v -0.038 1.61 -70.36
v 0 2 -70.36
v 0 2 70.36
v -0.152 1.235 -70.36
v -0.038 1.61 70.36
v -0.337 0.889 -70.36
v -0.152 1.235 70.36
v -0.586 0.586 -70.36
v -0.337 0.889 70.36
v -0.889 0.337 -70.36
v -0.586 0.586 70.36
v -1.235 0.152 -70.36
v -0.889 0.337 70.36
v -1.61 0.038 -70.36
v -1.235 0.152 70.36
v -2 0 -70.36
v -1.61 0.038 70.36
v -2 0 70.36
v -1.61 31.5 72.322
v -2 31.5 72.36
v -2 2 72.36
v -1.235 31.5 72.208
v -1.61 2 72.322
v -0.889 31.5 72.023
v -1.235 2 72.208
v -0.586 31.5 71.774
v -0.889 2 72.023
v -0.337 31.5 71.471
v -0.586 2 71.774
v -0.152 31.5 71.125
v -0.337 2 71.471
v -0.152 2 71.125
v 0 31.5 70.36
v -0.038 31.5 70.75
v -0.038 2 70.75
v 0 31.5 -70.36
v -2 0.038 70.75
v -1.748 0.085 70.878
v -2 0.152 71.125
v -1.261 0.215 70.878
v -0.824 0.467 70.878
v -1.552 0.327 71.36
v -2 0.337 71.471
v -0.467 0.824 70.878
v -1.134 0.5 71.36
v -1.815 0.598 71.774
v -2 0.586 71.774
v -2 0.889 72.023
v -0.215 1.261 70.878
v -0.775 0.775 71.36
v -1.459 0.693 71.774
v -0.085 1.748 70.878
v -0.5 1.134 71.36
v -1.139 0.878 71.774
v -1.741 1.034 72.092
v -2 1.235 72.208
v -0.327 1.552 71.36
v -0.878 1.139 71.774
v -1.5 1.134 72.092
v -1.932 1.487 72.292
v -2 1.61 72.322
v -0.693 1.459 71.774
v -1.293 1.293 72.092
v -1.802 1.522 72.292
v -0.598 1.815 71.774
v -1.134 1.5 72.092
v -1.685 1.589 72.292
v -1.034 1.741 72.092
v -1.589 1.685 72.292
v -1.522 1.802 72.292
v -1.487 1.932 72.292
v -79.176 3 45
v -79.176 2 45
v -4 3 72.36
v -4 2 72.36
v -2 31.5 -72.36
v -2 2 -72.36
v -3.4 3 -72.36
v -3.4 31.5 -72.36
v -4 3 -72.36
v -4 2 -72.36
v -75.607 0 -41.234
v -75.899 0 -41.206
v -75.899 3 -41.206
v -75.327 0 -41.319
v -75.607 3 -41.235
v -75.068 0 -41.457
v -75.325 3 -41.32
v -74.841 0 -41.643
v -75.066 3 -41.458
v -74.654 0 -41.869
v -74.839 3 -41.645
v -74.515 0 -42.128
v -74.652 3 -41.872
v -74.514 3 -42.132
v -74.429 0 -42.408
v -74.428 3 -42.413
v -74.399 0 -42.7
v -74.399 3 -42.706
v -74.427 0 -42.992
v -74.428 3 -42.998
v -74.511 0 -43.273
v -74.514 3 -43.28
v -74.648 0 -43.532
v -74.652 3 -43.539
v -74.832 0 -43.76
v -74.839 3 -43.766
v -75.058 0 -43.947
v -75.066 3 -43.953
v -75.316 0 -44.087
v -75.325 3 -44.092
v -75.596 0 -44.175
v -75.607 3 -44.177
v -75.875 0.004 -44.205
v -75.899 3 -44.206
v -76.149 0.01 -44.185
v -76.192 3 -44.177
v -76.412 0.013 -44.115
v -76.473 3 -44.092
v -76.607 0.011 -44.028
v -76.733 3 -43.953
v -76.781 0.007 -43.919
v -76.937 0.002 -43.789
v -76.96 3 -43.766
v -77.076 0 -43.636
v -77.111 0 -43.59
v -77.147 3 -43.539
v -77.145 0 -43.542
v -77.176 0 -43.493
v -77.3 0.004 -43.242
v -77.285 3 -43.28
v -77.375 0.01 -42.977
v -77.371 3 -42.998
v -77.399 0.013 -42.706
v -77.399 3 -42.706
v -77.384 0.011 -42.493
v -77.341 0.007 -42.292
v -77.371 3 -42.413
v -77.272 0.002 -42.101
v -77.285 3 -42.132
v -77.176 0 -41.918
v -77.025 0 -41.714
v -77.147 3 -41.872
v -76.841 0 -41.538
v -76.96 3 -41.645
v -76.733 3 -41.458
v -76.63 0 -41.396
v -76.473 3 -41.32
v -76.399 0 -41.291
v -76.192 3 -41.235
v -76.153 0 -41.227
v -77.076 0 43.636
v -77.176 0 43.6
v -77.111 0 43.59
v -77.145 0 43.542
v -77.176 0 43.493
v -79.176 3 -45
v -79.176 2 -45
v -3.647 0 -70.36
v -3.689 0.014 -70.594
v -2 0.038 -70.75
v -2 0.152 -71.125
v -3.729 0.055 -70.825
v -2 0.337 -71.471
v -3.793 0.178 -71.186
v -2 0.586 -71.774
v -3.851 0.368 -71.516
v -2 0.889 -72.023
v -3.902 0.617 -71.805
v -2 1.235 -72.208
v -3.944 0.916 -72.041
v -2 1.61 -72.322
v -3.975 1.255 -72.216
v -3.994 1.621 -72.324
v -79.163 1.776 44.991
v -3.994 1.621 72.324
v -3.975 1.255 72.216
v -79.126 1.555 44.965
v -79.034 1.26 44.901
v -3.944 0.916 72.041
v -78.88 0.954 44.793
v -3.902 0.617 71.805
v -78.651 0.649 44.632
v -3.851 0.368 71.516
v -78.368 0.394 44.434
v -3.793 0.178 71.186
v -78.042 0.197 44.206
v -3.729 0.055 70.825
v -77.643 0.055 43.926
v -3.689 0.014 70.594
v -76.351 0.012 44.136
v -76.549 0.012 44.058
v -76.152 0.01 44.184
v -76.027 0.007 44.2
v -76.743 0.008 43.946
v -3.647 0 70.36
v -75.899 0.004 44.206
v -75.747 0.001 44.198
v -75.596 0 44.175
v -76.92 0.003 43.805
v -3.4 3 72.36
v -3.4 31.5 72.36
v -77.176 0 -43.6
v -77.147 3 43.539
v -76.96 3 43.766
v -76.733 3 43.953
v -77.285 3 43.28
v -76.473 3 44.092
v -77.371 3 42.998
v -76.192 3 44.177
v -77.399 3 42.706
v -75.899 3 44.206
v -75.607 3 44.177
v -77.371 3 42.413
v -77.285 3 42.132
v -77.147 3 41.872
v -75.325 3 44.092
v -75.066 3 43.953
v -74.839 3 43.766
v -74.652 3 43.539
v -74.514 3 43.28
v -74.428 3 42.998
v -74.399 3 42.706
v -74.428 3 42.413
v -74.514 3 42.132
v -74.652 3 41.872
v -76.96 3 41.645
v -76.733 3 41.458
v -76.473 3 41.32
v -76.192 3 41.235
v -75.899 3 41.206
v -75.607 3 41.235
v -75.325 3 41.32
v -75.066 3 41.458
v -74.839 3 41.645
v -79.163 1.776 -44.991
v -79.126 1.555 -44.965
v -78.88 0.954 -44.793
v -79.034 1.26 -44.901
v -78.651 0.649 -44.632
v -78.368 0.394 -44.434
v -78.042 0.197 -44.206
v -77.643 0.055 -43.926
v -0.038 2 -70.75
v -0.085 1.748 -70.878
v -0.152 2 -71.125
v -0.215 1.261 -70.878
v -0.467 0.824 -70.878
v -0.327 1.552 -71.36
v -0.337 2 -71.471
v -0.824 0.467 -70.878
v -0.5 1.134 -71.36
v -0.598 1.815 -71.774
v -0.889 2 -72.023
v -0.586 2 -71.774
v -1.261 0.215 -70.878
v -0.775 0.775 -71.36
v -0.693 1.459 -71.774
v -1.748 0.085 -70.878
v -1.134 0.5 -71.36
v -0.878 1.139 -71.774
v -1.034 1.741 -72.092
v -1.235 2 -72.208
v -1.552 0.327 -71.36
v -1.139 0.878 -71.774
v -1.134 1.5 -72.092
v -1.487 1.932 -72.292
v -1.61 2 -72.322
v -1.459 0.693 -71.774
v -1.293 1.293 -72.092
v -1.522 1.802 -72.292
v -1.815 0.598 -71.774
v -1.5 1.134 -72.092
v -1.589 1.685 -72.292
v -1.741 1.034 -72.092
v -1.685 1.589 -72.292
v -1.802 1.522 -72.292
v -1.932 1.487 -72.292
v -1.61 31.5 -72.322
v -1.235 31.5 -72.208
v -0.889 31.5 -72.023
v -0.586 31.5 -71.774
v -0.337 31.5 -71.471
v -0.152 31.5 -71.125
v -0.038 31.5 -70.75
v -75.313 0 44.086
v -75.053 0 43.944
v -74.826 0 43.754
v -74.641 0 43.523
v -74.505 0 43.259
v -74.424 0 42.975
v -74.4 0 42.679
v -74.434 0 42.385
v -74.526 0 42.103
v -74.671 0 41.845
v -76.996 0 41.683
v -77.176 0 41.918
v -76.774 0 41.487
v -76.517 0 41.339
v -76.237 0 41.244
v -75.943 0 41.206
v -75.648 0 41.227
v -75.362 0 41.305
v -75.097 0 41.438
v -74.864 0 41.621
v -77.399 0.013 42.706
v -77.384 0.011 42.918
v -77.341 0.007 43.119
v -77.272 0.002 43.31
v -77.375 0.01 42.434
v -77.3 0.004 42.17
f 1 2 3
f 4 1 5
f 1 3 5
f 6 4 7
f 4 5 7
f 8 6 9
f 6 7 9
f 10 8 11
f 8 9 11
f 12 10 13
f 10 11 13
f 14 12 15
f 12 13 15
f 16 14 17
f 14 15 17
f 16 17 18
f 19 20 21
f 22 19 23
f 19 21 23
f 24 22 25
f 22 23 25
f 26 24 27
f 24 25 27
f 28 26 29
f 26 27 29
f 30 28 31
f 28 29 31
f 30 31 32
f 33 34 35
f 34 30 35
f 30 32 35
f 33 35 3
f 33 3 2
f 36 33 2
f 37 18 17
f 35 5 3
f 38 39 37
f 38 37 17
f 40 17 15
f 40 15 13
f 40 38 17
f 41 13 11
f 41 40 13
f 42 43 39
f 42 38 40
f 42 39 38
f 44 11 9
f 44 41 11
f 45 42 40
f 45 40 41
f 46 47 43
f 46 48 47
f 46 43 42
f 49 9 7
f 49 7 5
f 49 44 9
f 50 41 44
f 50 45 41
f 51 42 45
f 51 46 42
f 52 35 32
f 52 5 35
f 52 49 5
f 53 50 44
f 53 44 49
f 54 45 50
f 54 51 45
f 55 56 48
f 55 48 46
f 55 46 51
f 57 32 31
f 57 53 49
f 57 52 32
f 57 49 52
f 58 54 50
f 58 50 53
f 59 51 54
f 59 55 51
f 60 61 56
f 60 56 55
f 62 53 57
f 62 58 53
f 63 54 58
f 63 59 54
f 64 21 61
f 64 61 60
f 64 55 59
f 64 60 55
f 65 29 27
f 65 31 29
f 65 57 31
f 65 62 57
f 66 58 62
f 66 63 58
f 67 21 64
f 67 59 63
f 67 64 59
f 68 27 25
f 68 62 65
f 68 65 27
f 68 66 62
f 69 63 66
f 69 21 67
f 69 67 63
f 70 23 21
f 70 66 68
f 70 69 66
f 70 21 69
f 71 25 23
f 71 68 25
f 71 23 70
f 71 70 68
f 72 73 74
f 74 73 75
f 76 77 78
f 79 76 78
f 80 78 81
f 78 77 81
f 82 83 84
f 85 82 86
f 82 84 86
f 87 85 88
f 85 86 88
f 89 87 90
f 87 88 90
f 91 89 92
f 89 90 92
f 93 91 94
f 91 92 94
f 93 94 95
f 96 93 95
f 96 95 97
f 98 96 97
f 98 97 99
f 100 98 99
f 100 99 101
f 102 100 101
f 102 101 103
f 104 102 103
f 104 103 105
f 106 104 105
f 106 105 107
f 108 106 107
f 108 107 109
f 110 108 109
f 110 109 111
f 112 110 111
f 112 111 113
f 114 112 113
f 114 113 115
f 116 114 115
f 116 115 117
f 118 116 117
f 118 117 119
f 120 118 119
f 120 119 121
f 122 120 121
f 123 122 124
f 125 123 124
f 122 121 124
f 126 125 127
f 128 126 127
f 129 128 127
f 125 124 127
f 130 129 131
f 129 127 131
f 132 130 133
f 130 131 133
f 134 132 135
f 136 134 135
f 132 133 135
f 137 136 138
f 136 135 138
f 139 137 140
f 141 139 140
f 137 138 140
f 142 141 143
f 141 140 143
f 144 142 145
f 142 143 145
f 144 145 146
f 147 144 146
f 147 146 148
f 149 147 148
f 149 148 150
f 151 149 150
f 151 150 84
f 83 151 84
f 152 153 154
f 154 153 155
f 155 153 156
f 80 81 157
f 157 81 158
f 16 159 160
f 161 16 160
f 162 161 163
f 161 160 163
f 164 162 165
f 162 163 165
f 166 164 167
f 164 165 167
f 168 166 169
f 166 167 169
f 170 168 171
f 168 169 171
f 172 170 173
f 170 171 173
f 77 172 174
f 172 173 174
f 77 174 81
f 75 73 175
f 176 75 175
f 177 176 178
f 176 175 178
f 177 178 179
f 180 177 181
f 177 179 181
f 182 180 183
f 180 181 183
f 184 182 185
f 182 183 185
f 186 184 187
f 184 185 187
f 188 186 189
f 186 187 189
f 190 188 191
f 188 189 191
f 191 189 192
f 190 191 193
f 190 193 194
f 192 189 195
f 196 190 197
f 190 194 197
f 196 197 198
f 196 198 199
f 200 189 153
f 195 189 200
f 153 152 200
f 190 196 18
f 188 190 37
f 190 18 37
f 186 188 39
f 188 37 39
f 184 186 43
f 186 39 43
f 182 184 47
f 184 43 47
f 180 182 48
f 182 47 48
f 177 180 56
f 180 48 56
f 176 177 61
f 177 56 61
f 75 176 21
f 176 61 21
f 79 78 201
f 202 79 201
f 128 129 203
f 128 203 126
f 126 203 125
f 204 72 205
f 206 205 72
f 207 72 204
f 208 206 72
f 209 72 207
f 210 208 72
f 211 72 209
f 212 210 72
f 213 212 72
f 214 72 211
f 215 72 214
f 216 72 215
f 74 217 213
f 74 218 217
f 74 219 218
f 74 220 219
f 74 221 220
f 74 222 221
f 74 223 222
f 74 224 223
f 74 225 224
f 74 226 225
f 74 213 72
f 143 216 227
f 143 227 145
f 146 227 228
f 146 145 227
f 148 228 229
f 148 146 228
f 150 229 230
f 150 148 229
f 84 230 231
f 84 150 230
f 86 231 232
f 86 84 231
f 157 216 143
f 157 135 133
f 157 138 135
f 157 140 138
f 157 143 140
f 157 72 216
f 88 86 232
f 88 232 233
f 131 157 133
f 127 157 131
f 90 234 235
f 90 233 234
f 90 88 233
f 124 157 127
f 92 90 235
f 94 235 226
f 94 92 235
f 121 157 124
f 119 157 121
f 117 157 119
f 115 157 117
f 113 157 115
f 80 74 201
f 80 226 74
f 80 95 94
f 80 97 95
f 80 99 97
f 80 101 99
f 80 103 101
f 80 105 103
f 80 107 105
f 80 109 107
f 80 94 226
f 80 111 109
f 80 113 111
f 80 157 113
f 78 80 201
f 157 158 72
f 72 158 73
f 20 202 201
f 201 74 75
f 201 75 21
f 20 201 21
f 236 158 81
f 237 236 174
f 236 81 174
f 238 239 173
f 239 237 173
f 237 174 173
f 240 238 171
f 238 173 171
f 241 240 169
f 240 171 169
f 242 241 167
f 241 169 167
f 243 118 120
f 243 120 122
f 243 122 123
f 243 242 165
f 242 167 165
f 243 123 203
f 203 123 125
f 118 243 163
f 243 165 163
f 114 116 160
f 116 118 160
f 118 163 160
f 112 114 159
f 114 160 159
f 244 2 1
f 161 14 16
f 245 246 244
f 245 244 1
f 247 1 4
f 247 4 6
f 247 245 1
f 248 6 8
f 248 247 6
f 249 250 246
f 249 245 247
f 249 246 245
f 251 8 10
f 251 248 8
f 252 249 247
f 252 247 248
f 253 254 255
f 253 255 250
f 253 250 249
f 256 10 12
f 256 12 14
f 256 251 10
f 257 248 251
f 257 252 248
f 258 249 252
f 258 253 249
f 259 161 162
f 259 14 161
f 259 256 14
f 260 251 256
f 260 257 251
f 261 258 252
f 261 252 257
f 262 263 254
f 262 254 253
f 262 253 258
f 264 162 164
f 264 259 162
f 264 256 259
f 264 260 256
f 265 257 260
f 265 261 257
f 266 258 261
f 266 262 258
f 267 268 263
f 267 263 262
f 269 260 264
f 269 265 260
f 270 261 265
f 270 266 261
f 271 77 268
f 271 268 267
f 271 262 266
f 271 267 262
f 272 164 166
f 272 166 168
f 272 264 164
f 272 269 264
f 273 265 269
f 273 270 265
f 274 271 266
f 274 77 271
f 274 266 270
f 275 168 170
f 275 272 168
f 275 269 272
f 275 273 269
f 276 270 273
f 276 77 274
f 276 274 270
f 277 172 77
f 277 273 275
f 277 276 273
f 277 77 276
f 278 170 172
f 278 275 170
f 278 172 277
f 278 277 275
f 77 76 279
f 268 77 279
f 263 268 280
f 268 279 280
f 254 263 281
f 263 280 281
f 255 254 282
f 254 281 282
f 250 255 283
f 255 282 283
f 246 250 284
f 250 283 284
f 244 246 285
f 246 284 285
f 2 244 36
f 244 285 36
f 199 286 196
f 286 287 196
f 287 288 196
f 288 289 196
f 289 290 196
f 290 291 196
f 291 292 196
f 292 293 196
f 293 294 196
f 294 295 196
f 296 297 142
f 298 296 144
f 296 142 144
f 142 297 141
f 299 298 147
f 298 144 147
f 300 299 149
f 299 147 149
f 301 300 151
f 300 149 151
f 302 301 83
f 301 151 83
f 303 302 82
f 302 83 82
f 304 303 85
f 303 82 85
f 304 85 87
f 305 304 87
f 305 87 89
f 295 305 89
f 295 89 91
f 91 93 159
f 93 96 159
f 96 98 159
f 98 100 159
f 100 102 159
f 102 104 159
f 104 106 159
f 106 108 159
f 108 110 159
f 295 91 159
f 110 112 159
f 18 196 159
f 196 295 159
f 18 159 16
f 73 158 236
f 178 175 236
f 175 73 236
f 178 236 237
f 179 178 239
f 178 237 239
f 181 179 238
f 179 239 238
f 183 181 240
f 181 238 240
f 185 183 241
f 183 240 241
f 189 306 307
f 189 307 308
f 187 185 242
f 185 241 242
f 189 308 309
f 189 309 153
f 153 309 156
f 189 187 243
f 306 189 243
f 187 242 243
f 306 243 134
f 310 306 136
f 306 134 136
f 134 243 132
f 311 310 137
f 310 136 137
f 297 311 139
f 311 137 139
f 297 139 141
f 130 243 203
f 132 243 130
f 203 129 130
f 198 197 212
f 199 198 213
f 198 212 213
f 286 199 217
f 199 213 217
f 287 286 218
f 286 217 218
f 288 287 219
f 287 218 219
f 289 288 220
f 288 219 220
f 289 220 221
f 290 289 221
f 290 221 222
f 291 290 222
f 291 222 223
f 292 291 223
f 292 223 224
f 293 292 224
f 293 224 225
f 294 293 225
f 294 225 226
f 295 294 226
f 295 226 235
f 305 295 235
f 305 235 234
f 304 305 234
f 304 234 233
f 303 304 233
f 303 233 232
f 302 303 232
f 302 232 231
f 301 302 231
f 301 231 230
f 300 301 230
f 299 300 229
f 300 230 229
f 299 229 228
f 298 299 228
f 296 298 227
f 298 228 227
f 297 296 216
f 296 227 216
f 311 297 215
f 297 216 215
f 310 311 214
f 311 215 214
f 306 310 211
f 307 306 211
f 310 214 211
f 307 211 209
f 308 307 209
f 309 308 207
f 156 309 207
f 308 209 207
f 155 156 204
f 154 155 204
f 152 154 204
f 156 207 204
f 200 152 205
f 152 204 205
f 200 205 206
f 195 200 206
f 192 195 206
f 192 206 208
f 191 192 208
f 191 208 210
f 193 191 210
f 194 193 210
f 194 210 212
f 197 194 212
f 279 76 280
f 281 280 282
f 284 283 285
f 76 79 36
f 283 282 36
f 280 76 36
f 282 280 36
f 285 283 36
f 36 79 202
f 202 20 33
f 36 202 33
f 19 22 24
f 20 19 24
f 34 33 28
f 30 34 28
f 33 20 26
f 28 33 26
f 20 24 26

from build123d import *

# Parameters (mm, degrees)
BOSS_EXTRUDE1_DEPTH = 3
SKETCH2_W           = 3.4
SKETCH2_H           = 144.72
BOSS_EXTRUDE2_DEPTH = 31.5
SKETCH3_R           = 1.5
CUT_EXTRUDE1_DEPTH  = 40
FILLET1_R           = 2
FILLET2_R           = 2


with BuildPart() as part:
    # Sketch1 → Boss-Extrude1 (new body)
    with BuildSketch(Plane(origin=(0, 0, 0), x_dir=(1, 0, 0), z_dir=(0, 1, 0))):
        Polygon((-79.175996169, 45), (-79.175996169, -45), (-4, -72.36), (0, -72.36), (0, 72.36), (-4, 72.36), align=None)
    extrude(amount=BOSS_EXTRUDE1_DEPTH)

    # Sketch2 → Boss-Extrude2 (add)
    with BuildSketch(Plane.XZ):
        with Locations((-1.7, 0)):
            Rectangle(SKETCH2_W, SKETCH2_H)
    extrude(amount=-BOSS_EXTRUDE2_DEPTH)

    # Sketch3 → Cut-Extrude1 (cut)
    with BuildSketch(Plane(origin=(0, 3, 0), x_dir=(1, 0, 0), z_dir=(0, 1, 0))):
        with Locations(Location((-75.899387992, -42.705694255, 0), (0, 0, 270))):
            Circle(SKETCH3_R)
        with Locations(Location((-75.899387992, 42.705694255, 0), (0, 0, 270))):
            Circle(SKETCH3_R)
    extrude(amount=-CUT_EXTRUDE1_DEPTH, mode=Mode.SUBTRACT)

    # Fillet1
    # the kernel refuses this fillet: 2 mm, written as the material it takes off along each edge
    with BuildSketch(Plane(origin=(-9, 0, -72.36), x_dir=(0, 0, 1), z_dir=(1, 0, 0)), Plane(origin=(5, 0, 72.36), x_dir=(0, 0, -1), z_dir=(-1, 0, 0))) as fillet1_piece_1:
        with BuildLine():
            CenterArc((FILLET1_R, -FILLET1_R), FILLET1_R, 90, 90)
            Line((0, -FILLET1_R), (0, 0))
            Line((0, 0), (FILLET1_R, 0))
        make_face()
    extrude(amount=14, mode=Mode.SUBTRACT)
    with BuildSketch(Plane(origin=(0, 0, 77.36), x_dir=(-1, 0, 0), z_dir=(0, 0, -1))) as fillet1_piece_2:
        with BuildLine():
            CenterArc((FILLET1_R, FILLET1_R), FILLET1_R, 180, 90)
            Line((0, FILLET1_R), (0, 0))
            Line((0, 0), (FILLET1_R, 0))
        make_face()
    extrude(amount=154.72, mode=Mode.SUBTRACT)
    with BuildSketch(Plane(origin=(-83.87449593, 0, 43.29), x_dir=(0, 1, 0), z_dir=(0.9396999521123751, 0, 0.34199999999999997)), Plane(origin=(0.698499761, 0, -74.07), x_dir=(0, 1, 0), z_dir=(-0.9396999521123751, 0, 0.34199999999999997))) as fillet1_piece_3:
        with BuildLine():
            CenterArc((FILLET1_R, -FILLET1_R), FILLET1_R, 90, 90)
            Line((0, -FILLET1_R), (0, 0))
            Line((0, 0), (FILLET1_R, 0))
        make_face()
    extrude(amount=90, mode=Mode.SUBTRACT)
    with BuildSketch(Plane(origin=(-79.175996169, 0, -50), x_dir=(0, 1, 0), z_dir=(0, 0, 1))) as fillet1_piece_4:
        with BuildLine():
            CenterArc((FILLET1_R, -FILLET1_R), FILLET1_R, 90, 90)
            Line((0, -FILLET1_R), (0, 0))
            Line((0, 0), (FILLET1_R, 0))
        make_face()
    extrude(amount=100, mode=Mode.SUBTRACT)

    # Fillet2
    # the kernel refuses this fillet: 2 mm, written as the material it takes off along each edge
    with BuildSketch(Plane(origin=(-2, 2, -70.36), x_dir=(1, 0, 0), z_dir=(0, 0, -1))) as fillet2_piece_1_section:
        Polygon((0, 0), (FILLET2_R, 0), (FILLET2_R, FILLET2_R), (0, FILLET2_R), align=None)
    fillet2_piece_1 = extrude(amount=FILLET2_R, mode=Mode.PRIVATE)
    fillet2_piece_1 = fillet2_piece_1 - Plane(origin=(-2, 2, -70.36), x_dir=(-0.7071067811865475, 0.7071067811865475, 0), z_dir=(0, 0, -1)) * Sphere(FILLET2_R, mode=Mode.PRIVATE)
    add(fillet2_piece_1, mode=Mode.SUBTRACT)
    with BuildSketch(Plane(origin=(-2, 2, 70.36), x_dir=(1, 0, 0), z_dir=(0, 0, 1))) as fillet2_piece_2_section:
        Polygon((0, 0), (FILLET2_R, 0), (FILLET2_R, -FILLET2_R), (0, -FILLET2_R), align=None)
    fillet2_piece_2 = extrude(amount=FILLET2_R, mode=Mode.PRIVATE)
    fillet2_piece_2 = fillet2_piece_2 - Plane(origin=(-2, 2, 70.36), x_dir=(-0.7071067811865475, 0.7071067811865475, 0), z_dir=(0, 0, 1)) * Sphere(FILLET2_R, mode=Mode.PRIVATE)
    add(fillet2_piece_2, mode=Mode.SUBTRACT)
    with BuildSketch(Plane(origin=(0, 36.5, -72.36), x_dir=(-1, 0, 0), z_dir=(0, -1, 0)), Plane(origin=(0, 2, 72.36), x_dir=(-1, 0, 0), z_dir=(0, 1, 0))) as fillet2_piece_3:
        with BuildLine():
            CenterArc((FILLET2_R, -FILLET2_R), FILLET2_R, 90, 90)
            Line((0, -FILLET2_R), (0, 0))
            Line((0, 0), (FILLET2_R, 0))
        make_face()
    extrude(amount=34.5, mode=Mode.SUBTRACT)


solid = part.part
